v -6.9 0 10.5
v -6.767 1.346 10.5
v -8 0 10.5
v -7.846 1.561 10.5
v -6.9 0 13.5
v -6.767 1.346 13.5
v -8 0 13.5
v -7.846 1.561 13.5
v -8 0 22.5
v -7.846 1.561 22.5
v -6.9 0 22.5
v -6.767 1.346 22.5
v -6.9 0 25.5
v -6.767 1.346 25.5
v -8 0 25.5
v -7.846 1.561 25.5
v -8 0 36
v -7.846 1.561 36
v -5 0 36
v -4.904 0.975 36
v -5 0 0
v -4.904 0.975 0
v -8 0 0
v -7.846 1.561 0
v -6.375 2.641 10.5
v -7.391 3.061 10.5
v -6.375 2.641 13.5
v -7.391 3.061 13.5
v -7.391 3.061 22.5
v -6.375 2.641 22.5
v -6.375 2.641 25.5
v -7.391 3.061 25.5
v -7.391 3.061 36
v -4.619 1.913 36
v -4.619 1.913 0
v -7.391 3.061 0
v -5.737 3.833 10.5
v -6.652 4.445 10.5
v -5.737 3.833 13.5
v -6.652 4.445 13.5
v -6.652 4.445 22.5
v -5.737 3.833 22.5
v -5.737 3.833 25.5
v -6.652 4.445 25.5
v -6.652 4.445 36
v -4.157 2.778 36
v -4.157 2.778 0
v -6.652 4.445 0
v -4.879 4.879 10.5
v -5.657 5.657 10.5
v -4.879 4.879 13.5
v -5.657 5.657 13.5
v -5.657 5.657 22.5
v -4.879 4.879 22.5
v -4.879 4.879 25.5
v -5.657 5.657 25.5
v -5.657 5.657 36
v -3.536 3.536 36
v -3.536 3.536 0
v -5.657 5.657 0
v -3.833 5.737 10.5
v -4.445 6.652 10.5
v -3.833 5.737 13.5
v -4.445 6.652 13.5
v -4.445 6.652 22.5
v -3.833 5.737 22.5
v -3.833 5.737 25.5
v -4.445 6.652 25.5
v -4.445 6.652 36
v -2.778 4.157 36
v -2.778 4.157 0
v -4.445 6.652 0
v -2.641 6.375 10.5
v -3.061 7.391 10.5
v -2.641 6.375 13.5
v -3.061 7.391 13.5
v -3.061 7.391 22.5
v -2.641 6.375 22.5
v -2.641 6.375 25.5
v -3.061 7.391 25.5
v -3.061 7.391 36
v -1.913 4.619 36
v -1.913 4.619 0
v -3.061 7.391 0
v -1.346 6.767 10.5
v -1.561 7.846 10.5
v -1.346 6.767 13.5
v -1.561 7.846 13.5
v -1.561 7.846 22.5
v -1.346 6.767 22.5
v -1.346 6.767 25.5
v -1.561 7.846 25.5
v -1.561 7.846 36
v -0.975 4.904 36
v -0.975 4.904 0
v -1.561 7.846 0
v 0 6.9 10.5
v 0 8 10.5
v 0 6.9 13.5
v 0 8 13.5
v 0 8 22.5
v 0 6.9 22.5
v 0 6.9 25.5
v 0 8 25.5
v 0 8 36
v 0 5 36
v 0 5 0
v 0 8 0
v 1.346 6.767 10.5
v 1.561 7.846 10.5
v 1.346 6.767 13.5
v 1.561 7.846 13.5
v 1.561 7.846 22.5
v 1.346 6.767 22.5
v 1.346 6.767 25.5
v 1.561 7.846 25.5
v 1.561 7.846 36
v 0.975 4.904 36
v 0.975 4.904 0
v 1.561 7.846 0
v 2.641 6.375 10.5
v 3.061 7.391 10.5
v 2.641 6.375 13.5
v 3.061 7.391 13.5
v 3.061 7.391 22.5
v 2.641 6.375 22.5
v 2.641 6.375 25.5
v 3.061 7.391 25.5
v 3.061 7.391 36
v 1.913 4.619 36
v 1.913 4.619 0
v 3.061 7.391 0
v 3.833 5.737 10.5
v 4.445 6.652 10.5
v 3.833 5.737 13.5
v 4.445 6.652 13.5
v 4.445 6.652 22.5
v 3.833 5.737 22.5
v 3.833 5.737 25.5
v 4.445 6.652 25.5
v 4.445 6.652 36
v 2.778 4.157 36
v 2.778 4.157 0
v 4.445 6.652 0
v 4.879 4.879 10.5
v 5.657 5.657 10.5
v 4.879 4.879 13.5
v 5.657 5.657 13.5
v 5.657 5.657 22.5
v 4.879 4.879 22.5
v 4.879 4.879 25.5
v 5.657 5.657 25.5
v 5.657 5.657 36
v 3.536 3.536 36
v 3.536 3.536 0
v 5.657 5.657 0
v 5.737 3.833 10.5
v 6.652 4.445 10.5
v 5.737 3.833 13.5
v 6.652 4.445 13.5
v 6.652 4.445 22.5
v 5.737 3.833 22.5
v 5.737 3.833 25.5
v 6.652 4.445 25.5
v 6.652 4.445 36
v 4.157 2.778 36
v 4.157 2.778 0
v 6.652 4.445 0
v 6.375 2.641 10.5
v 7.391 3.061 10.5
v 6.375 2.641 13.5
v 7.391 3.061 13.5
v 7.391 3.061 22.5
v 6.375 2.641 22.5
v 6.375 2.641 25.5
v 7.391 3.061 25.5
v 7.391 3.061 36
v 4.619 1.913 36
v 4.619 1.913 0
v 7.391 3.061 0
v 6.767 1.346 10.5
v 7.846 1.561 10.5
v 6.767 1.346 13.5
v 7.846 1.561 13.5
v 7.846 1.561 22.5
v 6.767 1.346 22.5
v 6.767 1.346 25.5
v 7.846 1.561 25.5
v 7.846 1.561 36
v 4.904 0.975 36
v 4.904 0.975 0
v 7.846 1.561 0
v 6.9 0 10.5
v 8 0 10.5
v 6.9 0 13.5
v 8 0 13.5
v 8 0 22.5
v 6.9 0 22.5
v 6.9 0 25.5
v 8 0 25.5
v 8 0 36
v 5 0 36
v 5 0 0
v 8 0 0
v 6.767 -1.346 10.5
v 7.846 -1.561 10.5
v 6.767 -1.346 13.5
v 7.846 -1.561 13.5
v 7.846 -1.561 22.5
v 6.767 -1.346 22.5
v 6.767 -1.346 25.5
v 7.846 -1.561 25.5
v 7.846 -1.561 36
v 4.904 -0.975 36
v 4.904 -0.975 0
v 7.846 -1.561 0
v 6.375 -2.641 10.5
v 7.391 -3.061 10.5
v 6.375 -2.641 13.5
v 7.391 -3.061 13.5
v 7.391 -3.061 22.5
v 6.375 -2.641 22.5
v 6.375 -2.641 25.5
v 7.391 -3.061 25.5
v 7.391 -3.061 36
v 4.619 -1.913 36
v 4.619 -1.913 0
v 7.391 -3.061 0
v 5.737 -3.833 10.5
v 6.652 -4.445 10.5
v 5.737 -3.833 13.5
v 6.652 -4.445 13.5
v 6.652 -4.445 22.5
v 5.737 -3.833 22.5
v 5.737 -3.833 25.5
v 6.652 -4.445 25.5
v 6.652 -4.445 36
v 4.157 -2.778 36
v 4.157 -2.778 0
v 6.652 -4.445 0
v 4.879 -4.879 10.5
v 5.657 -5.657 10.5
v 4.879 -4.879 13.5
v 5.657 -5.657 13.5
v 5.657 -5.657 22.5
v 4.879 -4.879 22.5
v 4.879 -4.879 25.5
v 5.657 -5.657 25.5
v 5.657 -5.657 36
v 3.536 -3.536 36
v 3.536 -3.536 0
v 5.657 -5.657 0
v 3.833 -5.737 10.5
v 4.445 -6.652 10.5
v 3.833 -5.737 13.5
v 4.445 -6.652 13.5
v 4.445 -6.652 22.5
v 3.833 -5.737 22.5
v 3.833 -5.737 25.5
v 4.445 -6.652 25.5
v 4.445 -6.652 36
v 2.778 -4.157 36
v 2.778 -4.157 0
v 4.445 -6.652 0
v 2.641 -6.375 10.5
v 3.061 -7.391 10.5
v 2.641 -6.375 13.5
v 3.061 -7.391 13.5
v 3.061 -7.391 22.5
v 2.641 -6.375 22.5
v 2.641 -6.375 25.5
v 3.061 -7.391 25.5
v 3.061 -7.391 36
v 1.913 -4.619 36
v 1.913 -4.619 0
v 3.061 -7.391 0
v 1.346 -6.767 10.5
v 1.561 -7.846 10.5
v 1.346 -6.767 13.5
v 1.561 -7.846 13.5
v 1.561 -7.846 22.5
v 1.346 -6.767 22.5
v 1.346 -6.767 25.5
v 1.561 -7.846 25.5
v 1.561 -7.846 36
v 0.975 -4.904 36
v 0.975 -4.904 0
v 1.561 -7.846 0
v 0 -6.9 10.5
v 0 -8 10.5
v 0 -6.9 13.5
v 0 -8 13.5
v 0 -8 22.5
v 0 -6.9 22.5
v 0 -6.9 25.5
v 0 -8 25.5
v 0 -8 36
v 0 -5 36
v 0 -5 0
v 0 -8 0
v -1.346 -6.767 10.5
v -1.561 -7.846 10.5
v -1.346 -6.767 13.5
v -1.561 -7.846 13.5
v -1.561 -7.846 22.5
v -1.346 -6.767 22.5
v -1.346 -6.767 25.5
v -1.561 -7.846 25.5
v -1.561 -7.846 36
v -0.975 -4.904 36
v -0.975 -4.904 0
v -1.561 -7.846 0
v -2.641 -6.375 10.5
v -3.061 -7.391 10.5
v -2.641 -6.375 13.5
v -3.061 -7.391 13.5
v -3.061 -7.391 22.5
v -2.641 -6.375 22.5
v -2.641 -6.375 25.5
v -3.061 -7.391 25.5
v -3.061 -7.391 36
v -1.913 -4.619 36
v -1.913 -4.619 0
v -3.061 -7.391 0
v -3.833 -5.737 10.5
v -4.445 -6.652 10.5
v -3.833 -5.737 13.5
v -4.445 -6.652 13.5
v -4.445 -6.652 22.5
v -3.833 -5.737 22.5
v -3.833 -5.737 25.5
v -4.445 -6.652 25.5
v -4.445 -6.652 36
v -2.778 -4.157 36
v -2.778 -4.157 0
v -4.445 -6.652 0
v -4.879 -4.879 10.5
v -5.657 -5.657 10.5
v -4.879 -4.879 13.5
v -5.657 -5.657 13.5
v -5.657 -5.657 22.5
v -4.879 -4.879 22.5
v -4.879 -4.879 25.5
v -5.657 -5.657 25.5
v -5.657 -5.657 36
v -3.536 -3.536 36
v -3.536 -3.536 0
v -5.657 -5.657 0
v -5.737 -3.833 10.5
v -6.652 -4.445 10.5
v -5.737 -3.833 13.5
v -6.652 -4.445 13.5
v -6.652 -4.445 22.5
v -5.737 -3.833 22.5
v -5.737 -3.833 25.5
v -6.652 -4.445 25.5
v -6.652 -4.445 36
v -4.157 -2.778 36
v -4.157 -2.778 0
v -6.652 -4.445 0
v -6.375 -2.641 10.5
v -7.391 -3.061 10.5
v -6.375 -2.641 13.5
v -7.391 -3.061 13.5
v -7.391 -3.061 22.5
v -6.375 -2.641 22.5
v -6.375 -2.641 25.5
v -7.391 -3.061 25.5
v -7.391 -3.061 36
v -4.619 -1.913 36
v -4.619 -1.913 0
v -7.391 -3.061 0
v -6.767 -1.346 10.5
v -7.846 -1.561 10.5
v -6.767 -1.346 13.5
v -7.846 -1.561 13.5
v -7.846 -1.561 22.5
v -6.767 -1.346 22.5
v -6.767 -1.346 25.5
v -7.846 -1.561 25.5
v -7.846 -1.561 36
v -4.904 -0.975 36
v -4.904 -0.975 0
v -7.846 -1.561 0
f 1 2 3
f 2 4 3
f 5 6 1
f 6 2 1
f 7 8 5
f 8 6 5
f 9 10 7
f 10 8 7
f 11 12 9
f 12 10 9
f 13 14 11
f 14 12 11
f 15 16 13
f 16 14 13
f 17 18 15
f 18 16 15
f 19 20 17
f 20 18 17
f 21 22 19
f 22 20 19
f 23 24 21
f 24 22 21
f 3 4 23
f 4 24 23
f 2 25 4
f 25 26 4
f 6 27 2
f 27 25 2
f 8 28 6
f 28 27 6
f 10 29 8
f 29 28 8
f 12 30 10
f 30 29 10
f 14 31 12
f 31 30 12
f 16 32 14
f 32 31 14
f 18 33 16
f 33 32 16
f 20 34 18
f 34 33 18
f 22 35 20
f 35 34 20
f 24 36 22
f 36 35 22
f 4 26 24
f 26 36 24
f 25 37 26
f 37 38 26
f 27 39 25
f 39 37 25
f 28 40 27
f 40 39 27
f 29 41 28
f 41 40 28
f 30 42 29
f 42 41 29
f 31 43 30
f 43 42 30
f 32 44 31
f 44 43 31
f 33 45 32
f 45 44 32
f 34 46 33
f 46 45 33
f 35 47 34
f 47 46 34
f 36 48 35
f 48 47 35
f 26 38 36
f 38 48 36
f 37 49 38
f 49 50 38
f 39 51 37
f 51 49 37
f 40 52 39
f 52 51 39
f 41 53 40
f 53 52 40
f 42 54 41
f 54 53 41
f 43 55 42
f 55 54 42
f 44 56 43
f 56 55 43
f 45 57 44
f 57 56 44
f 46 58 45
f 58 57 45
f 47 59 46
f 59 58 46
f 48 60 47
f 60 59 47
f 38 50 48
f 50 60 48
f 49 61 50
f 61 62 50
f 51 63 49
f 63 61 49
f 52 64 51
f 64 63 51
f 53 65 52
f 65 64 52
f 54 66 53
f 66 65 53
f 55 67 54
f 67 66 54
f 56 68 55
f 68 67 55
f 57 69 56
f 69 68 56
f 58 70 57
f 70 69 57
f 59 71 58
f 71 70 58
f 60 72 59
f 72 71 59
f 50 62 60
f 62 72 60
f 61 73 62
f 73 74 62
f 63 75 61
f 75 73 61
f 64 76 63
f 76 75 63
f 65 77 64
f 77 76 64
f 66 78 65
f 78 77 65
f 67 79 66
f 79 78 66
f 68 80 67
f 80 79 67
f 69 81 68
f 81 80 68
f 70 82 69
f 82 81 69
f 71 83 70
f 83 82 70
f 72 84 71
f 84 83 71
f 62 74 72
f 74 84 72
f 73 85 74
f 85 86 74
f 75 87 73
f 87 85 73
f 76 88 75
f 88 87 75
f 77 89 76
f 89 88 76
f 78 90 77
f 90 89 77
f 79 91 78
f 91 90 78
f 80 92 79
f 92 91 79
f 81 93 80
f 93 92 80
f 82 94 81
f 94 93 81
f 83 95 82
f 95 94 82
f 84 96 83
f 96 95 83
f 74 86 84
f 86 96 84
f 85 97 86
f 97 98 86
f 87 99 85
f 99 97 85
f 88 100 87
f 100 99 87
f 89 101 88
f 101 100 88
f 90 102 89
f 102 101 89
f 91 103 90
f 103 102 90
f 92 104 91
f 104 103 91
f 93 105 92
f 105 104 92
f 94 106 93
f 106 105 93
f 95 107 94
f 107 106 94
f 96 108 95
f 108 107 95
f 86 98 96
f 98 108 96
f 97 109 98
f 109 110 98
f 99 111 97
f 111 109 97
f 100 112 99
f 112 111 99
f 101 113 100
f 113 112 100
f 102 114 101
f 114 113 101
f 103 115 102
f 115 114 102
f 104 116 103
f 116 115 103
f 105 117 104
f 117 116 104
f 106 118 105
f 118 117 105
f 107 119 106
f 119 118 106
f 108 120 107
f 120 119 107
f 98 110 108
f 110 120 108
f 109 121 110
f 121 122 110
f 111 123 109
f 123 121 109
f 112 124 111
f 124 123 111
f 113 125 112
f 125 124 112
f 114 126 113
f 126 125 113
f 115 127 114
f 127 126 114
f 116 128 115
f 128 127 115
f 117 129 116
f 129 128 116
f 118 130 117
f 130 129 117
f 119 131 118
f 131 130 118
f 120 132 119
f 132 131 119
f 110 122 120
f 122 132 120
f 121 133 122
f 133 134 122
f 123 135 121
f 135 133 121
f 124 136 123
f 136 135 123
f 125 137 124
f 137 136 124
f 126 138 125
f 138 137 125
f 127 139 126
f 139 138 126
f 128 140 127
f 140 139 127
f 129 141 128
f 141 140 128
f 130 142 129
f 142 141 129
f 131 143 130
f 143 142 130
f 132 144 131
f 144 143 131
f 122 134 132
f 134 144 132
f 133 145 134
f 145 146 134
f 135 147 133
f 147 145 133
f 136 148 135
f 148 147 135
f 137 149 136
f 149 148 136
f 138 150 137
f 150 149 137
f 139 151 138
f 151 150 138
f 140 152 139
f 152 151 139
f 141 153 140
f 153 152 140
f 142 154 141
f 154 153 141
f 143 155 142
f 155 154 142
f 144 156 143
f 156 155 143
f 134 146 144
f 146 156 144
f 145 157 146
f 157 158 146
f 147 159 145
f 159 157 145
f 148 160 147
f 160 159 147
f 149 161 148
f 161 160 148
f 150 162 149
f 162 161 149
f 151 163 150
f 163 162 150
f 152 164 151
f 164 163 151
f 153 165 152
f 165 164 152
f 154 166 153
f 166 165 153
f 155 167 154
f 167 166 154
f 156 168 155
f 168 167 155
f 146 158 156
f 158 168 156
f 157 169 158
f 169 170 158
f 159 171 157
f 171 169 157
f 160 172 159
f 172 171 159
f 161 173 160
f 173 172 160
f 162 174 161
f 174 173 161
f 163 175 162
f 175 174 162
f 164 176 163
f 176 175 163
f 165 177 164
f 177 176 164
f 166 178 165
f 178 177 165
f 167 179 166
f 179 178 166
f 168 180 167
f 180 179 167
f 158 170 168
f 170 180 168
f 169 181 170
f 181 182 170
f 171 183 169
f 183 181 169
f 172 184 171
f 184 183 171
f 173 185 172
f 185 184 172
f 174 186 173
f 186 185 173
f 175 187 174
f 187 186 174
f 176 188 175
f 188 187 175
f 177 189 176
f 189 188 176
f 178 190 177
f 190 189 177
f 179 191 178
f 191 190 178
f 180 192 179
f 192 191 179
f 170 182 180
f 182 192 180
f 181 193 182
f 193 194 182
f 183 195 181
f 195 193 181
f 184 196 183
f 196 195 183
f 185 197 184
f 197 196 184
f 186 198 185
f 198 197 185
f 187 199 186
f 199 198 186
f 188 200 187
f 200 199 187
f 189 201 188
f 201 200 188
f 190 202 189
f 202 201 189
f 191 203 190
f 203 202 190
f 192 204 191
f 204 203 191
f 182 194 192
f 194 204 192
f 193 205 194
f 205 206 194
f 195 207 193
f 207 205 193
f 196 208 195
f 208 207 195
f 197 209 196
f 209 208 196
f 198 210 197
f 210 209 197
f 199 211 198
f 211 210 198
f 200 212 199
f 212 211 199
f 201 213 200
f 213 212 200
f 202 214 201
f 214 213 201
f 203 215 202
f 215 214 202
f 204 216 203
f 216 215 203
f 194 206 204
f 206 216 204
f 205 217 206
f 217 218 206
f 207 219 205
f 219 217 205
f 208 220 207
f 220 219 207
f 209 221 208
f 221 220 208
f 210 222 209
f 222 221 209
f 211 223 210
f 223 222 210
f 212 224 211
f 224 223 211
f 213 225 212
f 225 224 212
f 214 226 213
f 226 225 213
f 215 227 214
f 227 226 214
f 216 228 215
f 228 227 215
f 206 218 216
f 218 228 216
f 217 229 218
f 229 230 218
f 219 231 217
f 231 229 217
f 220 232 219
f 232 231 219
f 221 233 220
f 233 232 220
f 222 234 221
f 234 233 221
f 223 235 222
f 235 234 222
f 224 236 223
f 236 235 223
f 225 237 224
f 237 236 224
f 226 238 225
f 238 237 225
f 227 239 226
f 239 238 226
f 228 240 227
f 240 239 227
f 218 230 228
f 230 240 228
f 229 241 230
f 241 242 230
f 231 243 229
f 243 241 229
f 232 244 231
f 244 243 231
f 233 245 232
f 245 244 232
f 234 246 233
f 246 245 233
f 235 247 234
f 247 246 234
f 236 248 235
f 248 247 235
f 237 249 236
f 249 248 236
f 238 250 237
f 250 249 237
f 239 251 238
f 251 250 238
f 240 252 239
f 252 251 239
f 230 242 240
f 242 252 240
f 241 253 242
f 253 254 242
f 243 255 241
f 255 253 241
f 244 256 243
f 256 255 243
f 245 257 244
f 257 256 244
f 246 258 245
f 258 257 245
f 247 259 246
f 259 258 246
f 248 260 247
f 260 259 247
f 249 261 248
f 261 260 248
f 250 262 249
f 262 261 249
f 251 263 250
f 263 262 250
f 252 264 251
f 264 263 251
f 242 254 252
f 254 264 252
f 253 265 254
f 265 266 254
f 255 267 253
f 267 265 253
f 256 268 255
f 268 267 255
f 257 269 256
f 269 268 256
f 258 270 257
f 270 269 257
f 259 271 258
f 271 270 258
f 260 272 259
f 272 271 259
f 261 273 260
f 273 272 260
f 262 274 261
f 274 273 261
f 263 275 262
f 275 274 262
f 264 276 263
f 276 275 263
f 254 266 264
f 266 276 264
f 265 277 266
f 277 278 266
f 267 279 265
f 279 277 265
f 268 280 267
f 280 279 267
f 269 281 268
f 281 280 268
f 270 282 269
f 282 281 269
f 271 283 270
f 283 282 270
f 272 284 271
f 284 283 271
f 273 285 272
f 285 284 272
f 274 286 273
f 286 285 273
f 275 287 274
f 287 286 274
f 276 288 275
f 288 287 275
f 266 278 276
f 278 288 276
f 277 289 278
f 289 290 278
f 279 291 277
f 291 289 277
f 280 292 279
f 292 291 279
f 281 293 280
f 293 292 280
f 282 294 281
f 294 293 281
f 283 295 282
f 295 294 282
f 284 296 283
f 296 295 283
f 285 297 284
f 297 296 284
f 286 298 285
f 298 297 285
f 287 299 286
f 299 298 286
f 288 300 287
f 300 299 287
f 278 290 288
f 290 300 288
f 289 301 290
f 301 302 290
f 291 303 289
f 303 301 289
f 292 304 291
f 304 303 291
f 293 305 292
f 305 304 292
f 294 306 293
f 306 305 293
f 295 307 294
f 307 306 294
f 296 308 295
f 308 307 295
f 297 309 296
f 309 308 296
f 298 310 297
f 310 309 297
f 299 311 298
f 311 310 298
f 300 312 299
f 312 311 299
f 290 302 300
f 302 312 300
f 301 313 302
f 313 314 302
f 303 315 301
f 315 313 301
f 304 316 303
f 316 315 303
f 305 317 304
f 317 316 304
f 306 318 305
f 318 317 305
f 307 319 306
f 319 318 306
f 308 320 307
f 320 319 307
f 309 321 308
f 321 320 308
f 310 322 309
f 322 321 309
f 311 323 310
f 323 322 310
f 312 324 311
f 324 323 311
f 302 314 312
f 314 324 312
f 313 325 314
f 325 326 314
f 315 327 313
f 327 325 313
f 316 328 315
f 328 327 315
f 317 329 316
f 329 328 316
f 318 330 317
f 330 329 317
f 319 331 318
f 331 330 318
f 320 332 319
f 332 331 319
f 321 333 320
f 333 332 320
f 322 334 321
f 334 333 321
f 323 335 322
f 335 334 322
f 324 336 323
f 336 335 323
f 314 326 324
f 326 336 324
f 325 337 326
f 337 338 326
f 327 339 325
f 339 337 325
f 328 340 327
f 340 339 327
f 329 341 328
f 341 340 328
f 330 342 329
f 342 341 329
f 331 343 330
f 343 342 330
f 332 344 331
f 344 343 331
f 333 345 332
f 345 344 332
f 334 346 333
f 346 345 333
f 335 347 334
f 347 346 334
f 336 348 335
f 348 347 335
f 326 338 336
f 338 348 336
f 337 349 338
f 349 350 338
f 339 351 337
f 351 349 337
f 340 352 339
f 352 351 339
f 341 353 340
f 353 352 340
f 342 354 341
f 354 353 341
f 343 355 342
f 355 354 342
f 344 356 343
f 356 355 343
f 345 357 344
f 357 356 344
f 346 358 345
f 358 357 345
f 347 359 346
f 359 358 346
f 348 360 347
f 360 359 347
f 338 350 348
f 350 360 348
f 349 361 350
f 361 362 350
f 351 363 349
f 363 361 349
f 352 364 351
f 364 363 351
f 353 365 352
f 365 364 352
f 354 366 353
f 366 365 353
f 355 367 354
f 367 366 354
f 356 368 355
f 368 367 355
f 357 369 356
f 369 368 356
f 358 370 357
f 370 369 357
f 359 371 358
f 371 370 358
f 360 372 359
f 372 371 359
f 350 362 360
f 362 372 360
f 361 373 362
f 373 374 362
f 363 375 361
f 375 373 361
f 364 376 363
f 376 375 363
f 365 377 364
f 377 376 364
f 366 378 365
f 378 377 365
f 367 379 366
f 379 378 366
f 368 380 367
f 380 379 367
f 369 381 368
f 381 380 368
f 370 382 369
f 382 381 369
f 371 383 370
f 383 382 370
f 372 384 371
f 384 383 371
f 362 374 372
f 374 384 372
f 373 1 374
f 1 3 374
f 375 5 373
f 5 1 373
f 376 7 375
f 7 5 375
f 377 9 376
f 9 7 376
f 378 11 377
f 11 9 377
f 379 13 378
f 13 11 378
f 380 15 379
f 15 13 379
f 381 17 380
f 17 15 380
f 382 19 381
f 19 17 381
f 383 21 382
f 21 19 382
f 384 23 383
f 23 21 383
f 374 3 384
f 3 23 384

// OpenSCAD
$fn = 32;

// ----------------------------------------------------------------------
// Grooved revolve: plain_grooves, bore R5
// ----------------------------------------------------------------------

// --- parameters (mm) ---
bore_r = 5;               // bore radius
outer_r = 8;              // outer radius of the body
total_h = 36;             // overall height, Z
wall = 3;                 // radial wall thickness
groove_w = 3;             // groove width
groove_d = 1.1;           // groove depth
grooves = 2;              // number of outer grooves

bbox_x = 2 * outer_r;  // full diameter
bore_d = 2 * bore_r;  // bore diameter
body_d = 2 * outer_r;  // body diameter
revolve_angle = 360;  // full turn around the Z axis

profile = [[5, 0], [8, 0], [8, 10.5], [6.9, 10.5], [6.9, 13.5], [8, 13.5], [8, 22.5], [6.9, 22.5], [6.9, 25.5], [8, 25.5], [8, 36], [5, 36]];  // primary outline, 12 points, counter clockwise

// --- the one profile operation ---
rotate_extrude(angle = revolve_angle) polygon(points = profile);
